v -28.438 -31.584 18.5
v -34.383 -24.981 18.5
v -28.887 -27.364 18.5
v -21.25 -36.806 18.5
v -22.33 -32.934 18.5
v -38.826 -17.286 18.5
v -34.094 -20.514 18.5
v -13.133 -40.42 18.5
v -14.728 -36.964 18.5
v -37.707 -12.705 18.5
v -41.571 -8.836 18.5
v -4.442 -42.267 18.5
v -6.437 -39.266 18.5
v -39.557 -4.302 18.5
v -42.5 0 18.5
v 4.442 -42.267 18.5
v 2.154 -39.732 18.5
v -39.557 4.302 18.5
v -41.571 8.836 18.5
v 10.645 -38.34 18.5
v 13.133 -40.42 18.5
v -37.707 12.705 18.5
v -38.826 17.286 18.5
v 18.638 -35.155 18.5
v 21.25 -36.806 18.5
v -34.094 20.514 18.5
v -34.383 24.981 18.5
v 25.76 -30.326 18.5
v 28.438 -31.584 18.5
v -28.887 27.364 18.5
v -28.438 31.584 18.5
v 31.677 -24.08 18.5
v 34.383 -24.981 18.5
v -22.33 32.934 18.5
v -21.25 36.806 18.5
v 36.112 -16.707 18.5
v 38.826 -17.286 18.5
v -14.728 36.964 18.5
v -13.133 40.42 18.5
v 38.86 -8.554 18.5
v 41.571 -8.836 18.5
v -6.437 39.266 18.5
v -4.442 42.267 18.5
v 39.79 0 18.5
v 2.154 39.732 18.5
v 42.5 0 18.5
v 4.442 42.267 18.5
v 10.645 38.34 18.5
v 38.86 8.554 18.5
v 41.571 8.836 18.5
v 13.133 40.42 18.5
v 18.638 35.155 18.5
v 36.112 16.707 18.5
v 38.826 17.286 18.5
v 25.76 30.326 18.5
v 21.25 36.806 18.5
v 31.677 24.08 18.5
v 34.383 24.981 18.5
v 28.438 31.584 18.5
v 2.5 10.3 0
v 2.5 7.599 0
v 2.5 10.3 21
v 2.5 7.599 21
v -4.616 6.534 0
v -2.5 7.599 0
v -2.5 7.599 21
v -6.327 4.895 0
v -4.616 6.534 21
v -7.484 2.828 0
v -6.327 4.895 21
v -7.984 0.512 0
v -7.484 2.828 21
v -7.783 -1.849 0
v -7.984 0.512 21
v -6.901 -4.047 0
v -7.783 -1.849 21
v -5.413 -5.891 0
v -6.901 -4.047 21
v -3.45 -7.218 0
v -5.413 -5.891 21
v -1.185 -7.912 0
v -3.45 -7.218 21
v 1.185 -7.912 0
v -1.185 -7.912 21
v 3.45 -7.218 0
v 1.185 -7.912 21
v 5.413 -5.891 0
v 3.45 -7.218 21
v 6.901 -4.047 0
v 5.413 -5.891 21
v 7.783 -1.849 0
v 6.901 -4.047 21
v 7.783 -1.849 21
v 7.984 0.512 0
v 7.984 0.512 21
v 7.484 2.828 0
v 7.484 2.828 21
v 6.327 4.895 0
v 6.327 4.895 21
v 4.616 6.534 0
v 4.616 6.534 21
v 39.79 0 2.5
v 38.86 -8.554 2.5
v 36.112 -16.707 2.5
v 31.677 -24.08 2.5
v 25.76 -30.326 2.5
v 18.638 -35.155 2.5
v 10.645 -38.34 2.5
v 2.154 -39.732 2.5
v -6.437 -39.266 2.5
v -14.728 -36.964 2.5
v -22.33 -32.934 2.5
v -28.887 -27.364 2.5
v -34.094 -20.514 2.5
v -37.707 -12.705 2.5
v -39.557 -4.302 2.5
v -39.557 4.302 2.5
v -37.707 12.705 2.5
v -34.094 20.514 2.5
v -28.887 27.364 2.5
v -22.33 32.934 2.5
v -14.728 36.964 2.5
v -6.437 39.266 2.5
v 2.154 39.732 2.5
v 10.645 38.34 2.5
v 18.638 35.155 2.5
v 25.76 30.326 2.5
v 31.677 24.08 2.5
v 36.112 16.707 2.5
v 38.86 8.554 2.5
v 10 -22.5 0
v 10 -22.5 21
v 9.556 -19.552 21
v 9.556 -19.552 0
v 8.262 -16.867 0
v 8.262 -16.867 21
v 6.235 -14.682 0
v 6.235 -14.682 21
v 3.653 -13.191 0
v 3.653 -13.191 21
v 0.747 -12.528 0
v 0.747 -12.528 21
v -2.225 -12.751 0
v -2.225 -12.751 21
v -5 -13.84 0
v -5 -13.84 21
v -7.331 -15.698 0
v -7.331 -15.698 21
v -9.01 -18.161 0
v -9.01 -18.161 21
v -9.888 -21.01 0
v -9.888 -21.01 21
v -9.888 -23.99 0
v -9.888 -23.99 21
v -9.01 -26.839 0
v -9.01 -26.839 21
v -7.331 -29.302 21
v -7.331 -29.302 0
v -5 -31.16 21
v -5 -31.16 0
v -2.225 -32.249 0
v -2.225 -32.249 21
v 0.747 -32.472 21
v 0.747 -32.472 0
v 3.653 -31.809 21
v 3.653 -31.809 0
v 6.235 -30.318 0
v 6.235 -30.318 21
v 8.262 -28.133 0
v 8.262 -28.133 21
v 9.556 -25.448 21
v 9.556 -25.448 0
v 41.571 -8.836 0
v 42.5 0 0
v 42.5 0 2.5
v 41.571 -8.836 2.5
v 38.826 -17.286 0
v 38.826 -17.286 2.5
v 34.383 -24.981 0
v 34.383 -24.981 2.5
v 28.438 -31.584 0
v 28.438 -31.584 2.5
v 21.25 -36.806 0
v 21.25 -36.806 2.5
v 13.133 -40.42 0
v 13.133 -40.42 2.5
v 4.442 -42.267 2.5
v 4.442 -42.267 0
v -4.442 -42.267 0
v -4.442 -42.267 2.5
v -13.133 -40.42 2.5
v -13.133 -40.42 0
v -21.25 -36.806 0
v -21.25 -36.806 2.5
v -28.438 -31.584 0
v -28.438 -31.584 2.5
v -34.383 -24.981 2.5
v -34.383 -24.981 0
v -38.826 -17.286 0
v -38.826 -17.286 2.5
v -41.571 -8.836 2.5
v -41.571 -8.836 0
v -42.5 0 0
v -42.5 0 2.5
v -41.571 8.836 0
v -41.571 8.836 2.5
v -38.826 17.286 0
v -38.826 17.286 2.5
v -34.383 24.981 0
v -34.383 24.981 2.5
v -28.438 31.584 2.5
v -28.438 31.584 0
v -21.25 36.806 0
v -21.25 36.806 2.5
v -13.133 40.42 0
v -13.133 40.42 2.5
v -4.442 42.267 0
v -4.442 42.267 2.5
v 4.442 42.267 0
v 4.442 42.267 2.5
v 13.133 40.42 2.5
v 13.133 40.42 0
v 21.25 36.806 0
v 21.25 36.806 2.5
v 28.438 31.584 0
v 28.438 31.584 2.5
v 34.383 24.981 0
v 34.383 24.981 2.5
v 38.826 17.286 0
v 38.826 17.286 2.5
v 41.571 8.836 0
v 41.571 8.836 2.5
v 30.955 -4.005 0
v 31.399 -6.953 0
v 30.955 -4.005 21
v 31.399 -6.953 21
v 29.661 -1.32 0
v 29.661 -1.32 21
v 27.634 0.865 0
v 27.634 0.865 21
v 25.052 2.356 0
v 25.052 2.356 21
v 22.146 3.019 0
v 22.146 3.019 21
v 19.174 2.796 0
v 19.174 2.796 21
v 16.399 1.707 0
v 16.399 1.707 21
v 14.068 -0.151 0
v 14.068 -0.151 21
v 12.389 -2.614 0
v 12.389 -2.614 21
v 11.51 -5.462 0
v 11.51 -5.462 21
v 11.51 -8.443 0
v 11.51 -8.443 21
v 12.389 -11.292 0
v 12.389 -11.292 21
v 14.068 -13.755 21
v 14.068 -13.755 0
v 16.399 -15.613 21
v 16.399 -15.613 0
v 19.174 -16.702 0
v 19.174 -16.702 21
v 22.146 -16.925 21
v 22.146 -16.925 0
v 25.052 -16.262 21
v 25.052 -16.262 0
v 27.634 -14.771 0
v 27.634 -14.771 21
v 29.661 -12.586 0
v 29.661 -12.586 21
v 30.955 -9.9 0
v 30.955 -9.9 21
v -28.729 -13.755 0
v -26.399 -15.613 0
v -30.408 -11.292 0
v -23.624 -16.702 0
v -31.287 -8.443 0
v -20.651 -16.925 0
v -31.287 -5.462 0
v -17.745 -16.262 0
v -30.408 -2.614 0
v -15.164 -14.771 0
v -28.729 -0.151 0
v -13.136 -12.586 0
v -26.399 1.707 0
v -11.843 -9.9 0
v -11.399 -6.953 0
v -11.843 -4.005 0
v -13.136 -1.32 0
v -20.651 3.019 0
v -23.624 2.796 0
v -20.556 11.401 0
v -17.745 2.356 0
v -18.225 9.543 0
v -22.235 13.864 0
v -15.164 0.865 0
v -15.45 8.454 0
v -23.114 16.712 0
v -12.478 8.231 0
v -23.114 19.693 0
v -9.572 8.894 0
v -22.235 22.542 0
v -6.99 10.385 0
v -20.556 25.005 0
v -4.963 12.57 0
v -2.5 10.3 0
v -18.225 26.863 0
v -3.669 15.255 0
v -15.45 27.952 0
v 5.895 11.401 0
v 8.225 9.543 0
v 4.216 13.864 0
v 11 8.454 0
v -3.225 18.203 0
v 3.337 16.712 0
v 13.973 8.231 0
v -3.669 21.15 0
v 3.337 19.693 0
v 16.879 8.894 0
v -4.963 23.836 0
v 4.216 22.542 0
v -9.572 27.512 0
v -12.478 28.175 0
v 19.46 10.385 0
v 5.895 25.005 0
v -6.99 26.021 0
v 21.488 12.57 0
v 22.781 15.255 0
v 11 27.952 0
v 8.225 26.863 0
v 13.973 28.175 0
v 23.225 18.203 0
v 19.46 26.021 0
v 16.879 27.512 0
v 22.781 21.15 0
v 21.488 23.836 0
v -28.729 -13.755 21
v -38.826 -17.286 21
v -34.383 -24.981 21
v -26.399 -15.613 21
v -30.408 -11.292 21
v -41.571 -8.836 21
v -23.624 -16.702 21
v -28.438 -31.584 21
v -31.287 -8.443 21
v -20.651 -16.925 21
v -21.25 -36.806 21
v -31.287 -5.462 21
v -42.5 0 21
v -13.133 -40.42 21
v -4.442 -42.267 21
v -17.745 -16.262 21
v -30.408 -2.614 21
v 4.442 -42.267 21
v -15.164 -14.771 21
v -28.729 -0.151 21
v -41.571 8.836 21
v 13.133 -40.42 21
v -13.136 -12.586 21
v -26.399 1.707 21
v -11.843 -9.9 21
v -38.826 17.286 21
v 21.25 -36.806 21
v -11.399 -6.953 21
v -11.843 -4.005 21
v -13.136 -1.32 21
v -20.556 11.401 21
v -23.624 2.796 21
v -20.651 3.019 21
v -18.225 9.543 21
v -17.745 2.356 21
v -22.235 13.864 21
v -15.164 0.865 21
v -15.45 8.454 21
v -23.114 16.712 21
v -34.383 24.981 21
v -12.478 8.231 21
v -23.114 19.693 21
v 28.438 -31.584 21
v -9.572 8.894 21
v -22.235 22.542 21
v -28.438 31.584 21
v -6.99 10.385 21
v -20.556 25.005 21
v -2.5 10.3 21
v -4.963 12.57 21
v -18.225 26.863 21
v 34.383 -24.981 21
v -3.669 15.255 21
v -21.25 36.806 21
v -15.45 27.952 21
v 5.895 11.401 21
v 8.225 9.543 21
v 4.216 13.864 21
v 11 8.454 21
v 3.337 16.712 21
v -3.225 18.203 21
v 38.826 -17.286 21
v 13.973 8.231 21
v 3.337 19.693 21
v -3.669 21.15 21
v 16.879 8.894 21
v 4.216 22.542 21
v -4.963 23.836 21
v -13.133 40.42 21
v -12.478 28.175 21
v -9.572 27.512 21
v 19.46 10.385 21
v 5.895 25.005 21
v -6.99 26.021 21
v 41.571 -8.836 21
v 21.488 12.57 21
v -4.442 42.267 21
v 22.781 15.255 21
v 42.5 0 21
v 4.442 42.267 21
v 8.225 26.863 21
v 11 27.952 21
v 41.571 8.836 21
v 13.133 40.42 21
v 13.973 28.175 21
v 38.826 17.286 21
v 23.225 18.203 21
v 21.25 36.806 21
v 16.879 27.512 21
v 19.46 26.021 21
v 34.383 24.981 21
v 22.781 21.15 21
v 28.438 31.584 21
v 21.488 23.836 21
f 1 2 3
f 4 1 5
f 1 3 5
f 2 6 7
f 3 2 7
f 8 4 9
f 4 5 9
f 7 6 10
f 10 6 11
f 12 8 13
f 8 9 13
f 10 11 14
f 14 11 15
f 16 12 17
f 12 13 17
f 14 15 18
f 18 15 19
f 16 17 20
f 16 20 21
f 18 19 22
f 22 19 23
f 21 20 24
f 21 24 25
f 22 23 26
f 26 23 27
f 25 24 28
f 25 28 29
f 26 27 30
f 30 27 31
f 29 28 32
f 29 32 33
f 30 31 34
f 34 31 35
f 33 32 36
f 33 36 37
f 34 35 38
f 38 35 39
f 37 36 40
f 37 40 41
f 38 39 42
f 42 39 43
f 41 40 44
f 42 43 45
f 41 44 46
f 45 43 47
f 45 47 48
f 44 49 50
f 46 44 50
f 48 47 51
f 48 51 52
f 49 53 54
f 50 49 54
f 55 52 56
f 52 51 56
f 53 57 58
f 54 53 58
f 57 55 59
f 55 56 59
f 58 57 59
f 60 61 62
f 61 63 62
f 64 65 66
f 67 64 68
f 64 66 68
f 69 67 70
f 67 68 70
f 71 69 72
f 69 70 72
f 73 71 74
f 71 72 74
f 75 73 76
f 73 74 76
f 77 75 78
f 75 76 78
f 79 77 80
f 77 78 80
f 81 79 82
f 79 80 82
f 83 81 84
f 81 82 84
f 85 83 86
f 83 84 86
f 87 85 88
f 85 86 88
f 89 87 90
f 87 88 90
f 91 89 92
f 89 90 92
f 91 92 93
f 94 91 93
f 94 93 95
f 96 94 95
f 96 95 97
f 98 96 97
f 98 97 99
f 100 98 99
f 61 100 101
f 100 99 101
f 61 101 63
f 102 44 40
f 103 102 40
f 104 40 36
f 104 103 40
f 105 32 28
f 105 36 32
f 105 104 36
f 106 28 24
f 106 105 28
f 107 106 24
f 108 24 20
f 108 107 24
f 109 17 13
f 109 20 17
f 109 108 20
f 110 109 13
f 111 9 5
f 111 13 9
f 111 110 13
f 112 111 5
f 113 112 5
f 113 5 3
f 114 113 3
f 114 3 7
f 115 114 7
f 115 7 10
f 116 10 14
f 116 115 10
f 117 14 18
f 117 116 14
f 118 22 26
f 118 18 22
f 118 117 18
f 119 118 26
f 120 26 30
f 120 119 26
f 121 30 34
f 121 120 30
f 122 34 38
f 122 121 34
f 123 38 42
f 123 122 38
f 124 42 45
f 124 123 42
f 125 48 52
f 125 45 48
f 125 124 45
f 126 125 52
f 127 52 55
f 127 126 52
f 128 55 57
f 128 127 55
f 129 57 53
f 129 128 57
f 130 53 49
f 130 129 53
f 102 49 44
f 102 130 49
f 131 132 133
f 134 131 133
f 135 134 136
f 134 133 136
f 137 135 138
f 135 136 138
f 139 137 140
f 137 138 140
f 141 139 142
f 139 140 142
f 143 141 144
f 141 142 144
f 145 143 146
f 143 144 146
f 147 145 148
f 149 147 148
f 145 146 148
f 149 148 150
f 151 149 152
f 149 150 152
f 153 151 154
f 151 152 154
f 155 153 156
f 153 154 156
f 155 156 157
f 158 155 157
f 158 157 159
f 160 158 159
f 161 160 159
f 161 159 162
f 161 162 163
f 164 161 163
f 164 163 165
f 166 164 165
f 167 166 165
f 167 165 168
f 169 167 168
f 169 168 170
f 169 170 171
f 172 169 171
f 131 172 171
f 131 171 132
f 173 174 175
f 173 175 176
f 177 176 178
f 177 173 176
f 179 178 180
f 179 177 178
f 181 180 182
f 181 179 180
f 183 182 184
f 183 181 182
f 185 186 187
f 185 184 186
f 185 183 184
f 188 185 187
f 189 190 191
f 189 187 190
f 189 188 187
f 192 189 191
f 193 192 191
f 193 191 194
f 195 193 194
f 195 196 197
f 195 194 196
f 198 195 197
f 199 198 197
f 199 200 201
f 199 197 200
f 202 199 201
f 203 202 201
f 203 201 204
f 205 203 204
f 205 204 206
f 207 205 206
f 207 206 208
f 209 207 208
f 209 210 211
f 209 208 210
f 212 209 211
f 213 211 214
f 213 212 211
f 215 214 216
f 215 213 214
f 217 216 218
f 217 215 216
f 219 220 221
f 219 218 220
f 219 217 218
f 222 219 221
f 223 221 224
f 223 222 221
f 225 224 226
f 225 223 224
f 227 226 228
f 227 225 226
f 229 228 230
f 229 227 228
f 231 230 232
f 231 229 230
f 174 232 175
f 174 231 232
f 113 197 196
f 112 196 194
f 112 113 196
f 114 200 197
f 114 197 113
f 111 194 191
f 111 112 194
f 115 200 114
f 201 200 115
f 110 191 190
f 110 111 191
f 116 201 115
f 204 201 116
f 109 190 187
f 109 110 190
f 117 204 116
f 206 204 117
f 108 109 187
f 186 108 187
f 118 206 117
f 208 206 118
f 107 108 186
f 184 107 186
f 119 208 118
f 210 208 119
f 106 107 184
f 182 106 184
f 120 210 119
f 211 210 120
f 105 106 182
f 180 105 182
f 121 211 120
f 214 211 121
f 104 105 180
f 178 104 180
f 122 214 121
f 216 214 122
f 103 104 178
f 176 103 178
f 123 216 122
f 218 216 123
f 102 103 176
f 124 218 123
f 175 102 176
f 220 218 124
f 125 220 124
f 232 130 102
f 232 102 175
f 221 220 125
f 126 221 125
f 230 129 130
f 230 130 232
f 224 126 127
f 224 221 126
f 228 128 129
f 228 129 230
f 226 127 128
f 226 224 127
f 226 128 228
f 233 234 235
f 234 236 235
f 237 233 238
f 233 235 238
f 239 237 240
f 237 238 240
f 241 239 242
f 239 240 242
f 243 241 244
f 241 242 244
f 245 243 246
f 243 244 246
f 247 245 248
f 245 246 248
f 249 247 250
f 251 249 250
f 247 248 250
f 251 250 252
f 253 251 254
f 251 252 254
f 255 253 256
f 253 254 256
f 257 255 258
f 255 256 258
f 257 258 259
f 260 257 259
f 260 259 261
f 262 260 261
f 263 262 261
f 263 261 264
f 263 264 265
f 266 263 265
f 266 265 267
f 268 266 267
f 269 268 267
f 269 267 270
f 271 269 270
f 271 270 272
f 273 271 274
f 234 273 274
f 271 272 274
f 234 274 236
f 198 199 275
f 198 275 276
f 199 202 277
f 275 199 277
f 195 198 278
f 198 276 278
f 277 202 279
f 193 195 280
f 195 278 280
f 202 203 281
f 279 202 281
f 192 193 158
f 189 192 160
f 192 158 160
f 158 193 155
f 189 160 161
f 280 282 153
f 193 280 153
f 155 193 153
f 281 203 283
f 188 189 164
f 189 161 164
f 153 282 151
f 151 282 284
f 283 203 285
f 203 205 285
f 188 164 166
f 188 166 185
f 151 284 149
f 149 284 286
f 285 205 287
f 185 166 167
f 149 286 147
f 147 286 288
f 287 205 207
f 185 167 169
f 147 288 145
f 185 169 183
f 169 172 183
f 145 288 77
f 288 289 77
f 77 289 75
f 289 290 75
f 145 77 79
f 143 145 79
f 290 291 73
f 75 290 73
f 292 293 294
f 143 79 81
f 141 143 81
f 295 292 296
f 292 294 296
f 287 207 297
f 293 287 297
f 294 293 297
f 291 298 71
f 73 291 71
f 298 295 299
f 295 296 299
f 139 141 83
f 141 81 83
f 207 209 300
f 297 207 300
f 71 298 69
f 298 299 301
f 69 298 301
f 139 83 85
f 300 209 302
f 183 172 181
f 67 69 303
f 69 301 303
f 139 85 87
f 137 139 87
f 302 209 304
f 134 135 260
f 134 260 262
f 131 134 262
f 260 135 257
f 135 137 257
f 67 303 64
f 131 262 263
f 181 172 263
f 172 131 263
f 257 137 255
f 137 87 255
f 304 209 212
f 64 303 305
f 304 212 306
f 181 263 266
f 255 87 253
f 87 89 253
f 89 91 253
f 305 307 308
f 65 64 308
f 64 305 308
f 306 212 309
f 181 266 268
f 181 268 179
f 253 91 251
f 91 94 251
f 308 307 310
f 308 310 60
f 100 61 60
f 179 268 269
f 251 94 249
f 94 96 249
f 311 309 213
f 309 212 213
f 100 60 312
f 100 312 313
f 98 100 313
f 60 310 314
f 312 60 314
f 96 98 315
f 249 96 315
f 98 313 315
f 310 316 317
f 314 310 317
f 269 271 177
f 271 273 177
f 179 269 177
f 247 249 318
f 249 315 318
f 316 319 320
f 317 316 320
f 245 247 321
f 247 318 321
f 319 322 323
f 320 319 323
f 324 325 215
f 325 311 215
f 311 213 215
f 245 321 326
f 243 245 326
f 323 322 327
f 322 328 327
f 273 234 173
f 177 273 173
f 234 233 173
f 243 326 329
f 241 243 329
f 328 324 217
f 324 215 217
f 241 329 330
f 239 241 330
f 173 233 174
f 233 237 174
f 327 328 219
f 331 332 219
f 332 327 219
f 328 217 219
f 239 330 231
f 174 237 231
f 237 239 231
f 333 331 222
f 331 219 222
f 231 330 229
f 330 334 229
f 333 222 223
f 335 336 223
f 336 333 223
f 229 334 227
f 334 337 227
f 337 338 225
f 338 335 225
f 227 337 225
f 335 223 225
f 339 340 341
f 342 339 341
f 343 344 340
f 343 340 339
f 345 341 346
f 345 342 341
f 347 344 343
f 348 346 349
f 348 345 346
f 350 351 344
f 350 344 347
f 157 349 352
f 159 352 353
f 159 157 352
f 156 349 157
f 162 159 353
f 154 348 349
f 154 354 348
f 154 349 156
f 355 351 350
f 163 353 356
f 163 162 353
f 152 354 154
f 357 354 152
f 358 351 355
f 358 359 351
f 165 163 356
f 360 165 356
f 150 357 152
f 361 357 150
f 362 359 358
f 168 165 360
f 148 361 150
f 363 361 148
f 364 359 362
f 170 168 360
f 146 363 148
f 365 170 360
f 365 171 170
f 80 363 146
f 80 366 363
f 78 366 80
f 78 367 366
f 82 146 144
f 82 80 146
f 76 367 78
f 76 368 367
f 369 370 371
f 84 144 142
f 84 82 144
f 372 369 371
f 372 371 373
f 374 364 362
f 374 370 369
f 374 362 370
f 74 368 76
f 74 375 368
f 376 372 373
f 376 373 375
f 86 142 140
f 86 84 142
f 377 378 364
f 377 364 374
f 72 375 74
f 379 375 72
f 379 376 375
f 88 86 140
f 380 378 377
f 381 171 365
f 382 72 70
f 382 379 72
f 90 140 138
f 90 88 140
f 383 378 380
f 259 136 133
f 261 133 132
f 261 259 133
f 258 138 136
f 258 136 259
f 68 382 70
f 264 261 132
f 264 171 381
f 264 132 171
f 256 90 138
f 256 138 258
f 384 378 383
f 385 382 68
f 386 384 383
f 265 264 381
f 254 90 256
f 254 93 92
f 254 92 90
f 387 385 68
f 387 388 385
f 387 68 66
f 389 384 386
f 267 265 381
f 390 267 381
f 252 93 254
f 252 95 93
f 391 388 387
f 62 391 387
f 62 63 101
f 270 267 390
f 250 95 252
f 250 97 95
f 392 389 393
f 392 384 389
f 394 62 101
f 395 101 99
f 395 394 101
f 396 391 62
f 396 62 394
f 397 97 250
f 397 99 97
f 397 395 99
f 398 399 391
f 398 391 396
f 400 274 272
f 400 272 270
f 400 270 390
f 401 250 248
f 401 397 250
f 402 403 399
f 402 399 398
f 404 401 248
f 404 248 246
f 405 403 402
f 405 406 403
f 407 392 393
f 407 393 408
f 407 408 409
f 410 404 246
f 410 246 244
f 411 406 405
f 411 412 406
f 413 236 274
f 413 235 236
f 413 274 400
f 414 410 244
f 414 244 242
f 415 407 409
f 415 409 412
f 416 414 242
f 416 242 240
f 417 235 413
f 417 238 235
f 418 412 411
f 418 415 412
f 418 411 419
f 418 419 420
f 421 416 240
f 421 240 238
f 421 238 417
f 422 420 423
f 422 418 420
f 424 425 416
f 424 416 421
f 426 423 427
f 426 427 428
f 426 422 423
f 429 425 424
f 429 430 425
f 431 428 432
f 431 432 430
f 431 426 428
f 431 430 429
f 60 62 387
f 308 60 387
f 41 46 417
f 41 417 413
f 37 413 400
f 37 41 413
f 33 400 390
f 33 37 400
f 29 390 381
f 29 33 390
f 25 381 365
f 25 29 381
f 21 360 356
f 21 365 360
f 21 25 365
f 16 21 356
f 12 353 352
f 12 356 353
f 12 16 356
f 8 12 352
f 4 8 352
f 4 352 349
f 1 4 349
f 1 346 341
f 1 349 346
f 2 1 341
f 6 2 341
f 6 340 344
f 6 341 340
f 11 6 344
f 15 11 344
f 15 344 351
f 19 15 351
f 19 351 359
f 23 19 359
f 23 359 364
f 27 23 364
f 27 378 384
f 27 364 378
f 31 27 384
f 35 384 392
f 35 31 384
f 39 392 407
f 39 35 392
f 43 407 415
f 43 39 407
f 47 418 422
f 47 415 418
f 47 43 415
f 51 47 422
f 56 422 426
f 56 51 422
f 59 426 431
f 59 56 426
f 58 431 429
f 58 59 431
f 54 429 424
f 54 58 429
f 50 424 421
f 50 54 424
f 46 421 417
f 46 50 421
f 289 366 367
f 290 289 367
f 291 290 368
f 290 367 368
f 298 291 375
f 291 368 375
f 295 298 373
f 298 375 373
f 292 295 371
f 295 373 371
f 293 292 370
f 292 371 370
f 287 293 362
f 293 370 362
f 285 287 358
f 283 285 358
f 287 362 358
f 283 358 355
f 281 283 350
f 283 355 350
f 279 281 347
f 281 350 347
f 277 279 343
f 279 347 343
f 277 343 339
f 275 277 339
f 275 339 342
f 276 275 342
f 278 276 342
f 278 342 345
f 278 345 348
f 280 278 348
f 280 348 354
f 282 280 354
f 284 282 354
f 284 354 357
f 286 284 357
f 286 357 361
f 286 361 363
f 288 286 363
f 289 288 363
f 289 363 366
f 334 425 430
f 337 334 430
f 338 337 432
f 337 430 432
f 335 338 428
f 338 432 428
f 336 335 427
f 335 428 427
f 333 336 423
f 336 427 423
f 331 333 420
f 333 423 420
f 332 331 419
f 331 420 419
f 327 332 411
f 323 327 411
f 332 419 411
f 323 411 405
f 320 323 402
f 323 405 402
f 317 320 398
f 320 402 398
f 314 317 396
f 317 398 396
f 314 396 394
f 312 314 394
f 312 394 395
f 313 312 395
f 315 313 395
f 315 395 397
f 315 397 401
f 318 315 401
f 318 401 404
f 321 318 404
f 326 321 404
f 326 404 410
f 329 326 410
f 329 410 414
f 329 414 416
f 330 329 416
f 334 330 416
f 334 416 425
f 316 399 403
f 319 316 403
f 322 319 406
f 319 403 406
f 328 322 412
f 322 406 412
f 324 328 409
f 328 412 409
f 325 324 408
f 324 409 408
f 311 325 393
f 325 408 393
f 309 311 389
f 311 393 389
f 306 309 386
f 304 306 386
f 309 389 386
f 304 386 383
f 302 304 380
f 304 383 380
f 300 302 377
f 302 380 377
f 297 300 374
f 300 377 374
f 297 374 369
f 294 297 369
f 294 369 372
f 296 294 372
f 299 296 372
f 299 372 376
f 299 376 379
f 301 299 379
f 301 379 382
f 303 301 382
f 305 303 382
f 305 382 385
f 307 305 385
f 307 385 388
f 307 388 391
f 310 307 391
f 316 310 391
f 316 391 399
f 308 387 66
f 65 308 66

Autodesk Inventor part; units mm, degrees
ref_plane "YZ Plane" through (0, 0, 0) normal (1, 0, 0) x (0, 1, 0)
ref_plane "XZ Plane" through (0, 0, 0) normal (0, 1, 0) x (-1, 0, 0)
ref_plane "XY Plane" through (0, 0, 0) normal (0, 0, 1) x (1, 0, 0)
sketch "Sketch1" plane through (0, 0, 0) normal (0, 0, 1) x (1, 0, 0)
  circle A0 centre (0, 0) radius 42.5
  dimension "d0" = 85
extrude "Extrusion1" add sketch "Sketch1" along normal blind 2.5
sketch "Sketch2" plane through (0, 0, 2.5) normal (0, 0, 1) x (1, 0, 0)
  circle A0 centre (0, 0) radius 39.79
  dimension "d3" = 79.58
extrude "Extrusion2" add sketch "Sketch2" along normal blind 16
sketch "Sketch3" plane through (0, 0, 18.5) normal (0, 0, 1) x (1, 0, 0)
  circle A0 centre (0, 0) radius 42.5
  dimension "d6" = 85
extrude "Extrusion3" add sketch "Sketch3" along normal blind 2.5
sketch "Sketch4" plane through (0, 0, 21) normal (0, 0, 1) x (1, 0, 0)
  circle A0 centre (0, 0) radius 8
  line L0 (-2.5, 5.7) -> (2.5, 5.7)
  line L1 (2.5, 5.7) -> (2.5, 10.3)
  line L2 (2.5, 10.3) -> (-2.5, 10.3)
  line L3 (-2.5, 10.3) -> (-2.5, 5.7)
  line L4 (-2.5, 5.7) -> (2.5, 10.3) construction
  line L5 (2.5, 5.7) -> (-2.5, 10.3) construction
  circle A1 centre (0, 0) radius 22.5
  circle A2 centre (0, -22.5) radius 10
  line L6 (0, 0) -> (0, -22.5)
  line L7 (0, 0) -> (22.5, 0) construction
  circle A3 centre (21.3988, -6.9529) radius 10
  circle A4 centre (13.2252, 18.2029) radius 10
  circle A5 centre (-13.2252, 18.2029) radius 10
  circle A6 centre (-21.3988, -6.9529) radius 10
  point P0 (0, 8)
  dimension "d9" = 16
  dimension "d14" = 45
  dimension "d10" = 5
  dimension "d11" = 4.6
  dimension "d15" = 20
  dimension "d16" = 90
  dimension "d19" = 360
extrude "Extrusion4" cut sketch "Sketch4" against normal blind 21 contours A0 L3 L0 L1 | A2 A1 L6 | L6 A1 A2 | L1 L0 L3 A0 | A0 L3 L2 L1 | A2 A1 | A3 A1 | A1 A3 | A6 A1 | A1 A6 | A4 A1 | A1 A4 | A5 A1 | A1 A5
properties part number "HTD5M 50 Pulley" material "Aluminum 6061"
